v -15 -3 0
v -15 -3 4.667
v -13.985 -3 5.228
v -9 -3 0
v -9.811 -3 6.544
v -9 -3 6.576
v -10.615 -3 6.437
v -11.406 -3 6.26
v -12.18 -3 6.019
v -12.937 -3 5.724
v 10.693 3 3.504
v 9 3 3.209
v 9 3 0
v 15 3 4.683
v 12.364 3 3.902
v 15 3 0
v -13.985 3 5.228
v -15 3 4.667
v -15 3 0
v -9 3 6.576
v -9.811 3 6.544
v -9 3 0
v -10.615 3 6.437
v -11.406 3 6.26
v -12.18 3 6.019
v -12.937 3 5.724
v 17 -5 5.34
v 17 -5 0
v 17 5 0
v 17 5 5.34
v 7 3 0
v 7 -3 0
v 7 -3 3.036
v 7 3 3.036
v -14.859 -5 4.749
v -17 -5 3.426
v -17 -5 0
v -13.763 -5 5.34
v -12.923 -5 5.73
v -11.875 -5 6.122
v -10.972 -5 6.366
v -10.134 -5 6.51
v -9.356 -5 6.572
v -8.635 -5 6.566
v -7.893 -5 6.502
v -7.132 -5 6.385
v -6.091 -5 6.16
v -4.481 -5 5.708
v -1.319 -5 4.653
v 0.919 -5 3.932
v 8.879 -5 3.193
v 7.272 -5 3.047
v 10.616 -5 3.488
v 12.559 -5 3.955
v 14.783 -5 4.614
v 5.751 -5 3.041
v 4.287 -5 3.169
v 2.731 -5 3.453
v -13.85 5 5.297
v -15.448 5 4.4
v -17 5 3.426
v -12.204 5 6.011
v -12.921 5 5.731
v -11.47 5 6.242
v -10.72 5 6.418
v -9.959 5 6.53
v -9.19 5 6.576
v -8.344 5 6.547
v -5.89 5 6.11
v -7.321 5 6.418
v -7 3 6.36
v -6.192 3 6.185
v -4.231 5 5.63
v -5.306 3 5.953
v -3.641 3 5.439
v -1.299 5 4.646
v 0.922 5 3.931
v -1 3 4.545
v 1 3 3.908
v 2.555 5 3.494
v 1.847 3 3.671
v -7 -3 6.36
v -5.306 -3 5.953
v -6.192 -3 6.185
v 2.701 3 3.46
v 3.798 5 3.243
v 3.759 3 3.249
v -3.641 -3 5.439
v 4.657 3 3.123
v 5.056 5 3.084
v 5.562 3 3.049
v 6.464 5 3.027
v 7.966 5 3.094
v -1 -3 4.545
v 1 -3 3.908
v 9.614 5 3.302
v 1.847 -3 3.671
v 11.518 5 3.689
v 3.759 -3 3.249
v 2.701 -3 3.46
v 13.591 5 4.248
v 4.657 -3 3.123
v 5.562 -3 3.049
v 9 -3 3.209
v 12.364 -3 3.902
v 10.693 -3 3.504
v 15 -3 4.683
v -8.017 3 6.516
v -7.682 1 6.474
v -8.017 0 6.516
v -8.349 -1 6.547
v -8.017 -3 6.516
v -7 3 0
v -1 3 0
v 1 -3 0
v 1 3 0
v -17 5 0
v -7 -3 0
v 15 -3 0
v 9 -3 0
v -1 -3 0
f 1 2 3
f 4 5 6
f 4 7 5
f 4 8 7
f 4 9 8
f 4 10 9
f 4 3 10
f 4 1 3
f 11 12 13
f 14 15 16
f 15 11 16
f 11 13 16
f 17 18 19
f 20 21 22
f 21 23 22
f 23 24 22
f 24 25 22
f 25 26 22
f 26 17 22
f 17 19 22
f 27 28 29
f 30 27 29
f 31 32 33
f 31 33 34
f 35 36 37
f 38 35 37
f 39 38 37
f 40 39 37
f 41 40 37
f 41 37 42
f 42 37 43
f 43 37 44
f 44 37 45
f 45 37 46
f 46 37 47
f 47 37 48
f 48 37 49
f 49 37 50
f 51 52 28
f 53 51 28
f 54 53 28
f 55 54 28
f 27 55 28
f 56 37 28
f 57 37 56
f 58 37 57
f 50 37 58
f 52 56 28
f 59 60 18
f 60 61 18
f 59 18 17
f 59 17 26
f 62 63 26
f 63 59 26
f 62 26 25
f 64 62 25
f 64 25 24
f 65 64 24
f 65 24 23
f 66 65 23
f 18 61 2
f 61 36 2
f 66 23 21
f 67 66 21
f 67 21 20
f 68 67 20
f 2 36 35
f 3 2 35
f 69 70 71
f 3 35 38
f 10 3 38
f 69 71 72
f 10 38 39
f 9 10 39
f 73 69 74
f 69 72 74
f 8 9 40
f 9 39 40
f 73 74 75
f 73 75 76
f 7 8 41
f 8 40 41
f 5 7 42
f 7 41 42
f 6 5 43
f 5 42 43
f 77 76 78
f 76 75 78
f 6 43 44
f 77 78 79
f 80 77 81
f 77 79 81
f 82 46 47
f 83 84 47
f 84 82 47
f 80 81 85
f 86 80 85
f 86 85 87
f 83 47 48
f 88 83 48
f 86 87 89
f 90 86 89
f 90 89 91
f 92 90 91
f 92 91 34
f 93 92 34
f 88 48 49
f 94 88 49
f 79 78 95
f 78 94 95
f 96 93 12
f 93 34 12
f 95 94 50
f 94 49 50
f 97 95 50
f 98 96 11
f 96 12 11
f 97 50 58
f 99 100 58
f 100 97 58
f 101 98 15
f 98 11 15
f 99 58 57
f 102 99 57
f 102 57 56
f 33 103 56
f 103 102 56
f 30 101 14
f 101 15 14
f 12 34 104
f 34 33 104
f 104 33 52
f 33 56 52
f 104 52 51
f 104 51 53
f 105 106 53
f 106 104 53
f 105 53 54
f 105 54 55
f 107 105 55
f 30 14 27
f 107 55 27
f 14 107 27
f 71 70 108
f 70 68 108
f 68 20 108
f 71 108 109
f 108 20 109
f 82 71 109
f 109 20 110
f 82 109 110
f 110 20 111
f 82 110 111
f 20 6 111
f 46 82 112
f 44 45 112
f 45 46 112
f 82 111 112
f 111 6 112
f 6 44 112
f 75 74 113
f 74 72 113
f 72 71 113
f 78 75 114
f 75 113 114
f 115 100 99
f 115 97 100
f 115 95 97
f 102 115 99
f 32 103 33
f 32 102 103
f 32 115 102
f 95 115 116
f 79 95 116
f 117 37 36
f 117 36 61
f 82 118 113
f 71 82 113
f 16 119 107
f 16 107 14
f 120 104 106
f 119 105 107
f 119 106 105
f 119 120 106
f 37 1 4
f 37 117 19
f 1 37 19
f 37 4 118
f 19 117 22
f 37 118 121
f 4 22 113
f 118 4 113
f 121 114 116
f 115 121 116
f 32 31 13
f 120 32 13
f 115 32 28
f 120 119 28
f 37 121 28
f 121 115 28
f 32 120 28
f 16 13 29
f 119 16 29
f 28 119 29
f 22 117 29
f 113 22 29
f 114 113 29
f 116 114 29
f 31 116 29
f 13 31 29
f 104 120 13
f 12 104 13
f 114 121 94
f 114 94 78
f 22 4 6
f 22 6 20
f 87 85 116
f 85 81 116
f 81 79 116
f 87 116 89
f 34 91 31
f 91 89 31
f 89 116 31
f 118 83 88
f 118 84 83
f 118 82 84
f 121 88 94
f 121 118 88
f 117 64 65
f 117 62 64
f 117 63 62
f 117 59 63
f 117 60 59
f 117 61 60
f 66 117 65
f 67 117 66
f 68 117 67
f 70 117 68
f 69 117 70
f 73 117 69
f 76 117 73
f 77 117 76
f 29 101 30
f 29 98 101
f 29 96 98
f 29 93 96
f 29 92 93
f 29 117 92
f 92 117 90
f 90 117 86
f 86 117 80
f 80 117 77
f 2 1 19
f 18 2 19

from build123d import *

# Parameters (mm, degrees)
F0_W     = 34
F0_H     = 10
F0_W_2   = 6
F0_H_2   = 6
F1_DEPTH = 8
F3_DEPTH = 25


with BuildPart() as f1:
    # F0 (on Top) → F1 (new body)
    with BuildSketch(Plane.XY):
        Rectangle(F0_W, F0_H)
        with Locations((-12, 0)):
            Rectangle(F0_W_2, F0_H_2, mode=Mode.SUBTRACT)
        with Locations((-4, 0)):
            Rectangle(F0_W_2, F0_H_2, mode=Mode.SUBTRACT)
        with Locations((4, 0)):
            Rectangle(F0_W_2, F0_H_2, mode=Mode.SUBTRACT)
        with Locations((12, 0)):
            Rectangle(F0_W_2, F0_H_2, mode=Mode.SUBTRACT)
    extrude(amount=F1_DEPTH)

    # F2 (on face) → F3 (cut)
    with BuildSketch(Plane.XZ.offset(5)):
        with BuildLine():
            Line((-17, 8), (-17, 3.4255662467))
            add(Edge.make_bspline(
                [(-17, 3.4255662467), (-14.4839407278, 5.034720914), (-8.8272313849, 8.6524895177), (4.409679576, 1.15052902), (12.8389931488, 3.9556428763), (17, 5.3403461352)],
                knots=[0, 0, 0, 0, 0.2885916145, 0.6488236984, 1, 1, 1, 1], degree=3))
            Line((17, 5.3403461352), (17, 8))
            Line((17, 8), (-17, 8))
        make_face()
    extrude(amount=-F3_DEPTH, mode=Mode.SUBTRACT)


solid = f1.part
